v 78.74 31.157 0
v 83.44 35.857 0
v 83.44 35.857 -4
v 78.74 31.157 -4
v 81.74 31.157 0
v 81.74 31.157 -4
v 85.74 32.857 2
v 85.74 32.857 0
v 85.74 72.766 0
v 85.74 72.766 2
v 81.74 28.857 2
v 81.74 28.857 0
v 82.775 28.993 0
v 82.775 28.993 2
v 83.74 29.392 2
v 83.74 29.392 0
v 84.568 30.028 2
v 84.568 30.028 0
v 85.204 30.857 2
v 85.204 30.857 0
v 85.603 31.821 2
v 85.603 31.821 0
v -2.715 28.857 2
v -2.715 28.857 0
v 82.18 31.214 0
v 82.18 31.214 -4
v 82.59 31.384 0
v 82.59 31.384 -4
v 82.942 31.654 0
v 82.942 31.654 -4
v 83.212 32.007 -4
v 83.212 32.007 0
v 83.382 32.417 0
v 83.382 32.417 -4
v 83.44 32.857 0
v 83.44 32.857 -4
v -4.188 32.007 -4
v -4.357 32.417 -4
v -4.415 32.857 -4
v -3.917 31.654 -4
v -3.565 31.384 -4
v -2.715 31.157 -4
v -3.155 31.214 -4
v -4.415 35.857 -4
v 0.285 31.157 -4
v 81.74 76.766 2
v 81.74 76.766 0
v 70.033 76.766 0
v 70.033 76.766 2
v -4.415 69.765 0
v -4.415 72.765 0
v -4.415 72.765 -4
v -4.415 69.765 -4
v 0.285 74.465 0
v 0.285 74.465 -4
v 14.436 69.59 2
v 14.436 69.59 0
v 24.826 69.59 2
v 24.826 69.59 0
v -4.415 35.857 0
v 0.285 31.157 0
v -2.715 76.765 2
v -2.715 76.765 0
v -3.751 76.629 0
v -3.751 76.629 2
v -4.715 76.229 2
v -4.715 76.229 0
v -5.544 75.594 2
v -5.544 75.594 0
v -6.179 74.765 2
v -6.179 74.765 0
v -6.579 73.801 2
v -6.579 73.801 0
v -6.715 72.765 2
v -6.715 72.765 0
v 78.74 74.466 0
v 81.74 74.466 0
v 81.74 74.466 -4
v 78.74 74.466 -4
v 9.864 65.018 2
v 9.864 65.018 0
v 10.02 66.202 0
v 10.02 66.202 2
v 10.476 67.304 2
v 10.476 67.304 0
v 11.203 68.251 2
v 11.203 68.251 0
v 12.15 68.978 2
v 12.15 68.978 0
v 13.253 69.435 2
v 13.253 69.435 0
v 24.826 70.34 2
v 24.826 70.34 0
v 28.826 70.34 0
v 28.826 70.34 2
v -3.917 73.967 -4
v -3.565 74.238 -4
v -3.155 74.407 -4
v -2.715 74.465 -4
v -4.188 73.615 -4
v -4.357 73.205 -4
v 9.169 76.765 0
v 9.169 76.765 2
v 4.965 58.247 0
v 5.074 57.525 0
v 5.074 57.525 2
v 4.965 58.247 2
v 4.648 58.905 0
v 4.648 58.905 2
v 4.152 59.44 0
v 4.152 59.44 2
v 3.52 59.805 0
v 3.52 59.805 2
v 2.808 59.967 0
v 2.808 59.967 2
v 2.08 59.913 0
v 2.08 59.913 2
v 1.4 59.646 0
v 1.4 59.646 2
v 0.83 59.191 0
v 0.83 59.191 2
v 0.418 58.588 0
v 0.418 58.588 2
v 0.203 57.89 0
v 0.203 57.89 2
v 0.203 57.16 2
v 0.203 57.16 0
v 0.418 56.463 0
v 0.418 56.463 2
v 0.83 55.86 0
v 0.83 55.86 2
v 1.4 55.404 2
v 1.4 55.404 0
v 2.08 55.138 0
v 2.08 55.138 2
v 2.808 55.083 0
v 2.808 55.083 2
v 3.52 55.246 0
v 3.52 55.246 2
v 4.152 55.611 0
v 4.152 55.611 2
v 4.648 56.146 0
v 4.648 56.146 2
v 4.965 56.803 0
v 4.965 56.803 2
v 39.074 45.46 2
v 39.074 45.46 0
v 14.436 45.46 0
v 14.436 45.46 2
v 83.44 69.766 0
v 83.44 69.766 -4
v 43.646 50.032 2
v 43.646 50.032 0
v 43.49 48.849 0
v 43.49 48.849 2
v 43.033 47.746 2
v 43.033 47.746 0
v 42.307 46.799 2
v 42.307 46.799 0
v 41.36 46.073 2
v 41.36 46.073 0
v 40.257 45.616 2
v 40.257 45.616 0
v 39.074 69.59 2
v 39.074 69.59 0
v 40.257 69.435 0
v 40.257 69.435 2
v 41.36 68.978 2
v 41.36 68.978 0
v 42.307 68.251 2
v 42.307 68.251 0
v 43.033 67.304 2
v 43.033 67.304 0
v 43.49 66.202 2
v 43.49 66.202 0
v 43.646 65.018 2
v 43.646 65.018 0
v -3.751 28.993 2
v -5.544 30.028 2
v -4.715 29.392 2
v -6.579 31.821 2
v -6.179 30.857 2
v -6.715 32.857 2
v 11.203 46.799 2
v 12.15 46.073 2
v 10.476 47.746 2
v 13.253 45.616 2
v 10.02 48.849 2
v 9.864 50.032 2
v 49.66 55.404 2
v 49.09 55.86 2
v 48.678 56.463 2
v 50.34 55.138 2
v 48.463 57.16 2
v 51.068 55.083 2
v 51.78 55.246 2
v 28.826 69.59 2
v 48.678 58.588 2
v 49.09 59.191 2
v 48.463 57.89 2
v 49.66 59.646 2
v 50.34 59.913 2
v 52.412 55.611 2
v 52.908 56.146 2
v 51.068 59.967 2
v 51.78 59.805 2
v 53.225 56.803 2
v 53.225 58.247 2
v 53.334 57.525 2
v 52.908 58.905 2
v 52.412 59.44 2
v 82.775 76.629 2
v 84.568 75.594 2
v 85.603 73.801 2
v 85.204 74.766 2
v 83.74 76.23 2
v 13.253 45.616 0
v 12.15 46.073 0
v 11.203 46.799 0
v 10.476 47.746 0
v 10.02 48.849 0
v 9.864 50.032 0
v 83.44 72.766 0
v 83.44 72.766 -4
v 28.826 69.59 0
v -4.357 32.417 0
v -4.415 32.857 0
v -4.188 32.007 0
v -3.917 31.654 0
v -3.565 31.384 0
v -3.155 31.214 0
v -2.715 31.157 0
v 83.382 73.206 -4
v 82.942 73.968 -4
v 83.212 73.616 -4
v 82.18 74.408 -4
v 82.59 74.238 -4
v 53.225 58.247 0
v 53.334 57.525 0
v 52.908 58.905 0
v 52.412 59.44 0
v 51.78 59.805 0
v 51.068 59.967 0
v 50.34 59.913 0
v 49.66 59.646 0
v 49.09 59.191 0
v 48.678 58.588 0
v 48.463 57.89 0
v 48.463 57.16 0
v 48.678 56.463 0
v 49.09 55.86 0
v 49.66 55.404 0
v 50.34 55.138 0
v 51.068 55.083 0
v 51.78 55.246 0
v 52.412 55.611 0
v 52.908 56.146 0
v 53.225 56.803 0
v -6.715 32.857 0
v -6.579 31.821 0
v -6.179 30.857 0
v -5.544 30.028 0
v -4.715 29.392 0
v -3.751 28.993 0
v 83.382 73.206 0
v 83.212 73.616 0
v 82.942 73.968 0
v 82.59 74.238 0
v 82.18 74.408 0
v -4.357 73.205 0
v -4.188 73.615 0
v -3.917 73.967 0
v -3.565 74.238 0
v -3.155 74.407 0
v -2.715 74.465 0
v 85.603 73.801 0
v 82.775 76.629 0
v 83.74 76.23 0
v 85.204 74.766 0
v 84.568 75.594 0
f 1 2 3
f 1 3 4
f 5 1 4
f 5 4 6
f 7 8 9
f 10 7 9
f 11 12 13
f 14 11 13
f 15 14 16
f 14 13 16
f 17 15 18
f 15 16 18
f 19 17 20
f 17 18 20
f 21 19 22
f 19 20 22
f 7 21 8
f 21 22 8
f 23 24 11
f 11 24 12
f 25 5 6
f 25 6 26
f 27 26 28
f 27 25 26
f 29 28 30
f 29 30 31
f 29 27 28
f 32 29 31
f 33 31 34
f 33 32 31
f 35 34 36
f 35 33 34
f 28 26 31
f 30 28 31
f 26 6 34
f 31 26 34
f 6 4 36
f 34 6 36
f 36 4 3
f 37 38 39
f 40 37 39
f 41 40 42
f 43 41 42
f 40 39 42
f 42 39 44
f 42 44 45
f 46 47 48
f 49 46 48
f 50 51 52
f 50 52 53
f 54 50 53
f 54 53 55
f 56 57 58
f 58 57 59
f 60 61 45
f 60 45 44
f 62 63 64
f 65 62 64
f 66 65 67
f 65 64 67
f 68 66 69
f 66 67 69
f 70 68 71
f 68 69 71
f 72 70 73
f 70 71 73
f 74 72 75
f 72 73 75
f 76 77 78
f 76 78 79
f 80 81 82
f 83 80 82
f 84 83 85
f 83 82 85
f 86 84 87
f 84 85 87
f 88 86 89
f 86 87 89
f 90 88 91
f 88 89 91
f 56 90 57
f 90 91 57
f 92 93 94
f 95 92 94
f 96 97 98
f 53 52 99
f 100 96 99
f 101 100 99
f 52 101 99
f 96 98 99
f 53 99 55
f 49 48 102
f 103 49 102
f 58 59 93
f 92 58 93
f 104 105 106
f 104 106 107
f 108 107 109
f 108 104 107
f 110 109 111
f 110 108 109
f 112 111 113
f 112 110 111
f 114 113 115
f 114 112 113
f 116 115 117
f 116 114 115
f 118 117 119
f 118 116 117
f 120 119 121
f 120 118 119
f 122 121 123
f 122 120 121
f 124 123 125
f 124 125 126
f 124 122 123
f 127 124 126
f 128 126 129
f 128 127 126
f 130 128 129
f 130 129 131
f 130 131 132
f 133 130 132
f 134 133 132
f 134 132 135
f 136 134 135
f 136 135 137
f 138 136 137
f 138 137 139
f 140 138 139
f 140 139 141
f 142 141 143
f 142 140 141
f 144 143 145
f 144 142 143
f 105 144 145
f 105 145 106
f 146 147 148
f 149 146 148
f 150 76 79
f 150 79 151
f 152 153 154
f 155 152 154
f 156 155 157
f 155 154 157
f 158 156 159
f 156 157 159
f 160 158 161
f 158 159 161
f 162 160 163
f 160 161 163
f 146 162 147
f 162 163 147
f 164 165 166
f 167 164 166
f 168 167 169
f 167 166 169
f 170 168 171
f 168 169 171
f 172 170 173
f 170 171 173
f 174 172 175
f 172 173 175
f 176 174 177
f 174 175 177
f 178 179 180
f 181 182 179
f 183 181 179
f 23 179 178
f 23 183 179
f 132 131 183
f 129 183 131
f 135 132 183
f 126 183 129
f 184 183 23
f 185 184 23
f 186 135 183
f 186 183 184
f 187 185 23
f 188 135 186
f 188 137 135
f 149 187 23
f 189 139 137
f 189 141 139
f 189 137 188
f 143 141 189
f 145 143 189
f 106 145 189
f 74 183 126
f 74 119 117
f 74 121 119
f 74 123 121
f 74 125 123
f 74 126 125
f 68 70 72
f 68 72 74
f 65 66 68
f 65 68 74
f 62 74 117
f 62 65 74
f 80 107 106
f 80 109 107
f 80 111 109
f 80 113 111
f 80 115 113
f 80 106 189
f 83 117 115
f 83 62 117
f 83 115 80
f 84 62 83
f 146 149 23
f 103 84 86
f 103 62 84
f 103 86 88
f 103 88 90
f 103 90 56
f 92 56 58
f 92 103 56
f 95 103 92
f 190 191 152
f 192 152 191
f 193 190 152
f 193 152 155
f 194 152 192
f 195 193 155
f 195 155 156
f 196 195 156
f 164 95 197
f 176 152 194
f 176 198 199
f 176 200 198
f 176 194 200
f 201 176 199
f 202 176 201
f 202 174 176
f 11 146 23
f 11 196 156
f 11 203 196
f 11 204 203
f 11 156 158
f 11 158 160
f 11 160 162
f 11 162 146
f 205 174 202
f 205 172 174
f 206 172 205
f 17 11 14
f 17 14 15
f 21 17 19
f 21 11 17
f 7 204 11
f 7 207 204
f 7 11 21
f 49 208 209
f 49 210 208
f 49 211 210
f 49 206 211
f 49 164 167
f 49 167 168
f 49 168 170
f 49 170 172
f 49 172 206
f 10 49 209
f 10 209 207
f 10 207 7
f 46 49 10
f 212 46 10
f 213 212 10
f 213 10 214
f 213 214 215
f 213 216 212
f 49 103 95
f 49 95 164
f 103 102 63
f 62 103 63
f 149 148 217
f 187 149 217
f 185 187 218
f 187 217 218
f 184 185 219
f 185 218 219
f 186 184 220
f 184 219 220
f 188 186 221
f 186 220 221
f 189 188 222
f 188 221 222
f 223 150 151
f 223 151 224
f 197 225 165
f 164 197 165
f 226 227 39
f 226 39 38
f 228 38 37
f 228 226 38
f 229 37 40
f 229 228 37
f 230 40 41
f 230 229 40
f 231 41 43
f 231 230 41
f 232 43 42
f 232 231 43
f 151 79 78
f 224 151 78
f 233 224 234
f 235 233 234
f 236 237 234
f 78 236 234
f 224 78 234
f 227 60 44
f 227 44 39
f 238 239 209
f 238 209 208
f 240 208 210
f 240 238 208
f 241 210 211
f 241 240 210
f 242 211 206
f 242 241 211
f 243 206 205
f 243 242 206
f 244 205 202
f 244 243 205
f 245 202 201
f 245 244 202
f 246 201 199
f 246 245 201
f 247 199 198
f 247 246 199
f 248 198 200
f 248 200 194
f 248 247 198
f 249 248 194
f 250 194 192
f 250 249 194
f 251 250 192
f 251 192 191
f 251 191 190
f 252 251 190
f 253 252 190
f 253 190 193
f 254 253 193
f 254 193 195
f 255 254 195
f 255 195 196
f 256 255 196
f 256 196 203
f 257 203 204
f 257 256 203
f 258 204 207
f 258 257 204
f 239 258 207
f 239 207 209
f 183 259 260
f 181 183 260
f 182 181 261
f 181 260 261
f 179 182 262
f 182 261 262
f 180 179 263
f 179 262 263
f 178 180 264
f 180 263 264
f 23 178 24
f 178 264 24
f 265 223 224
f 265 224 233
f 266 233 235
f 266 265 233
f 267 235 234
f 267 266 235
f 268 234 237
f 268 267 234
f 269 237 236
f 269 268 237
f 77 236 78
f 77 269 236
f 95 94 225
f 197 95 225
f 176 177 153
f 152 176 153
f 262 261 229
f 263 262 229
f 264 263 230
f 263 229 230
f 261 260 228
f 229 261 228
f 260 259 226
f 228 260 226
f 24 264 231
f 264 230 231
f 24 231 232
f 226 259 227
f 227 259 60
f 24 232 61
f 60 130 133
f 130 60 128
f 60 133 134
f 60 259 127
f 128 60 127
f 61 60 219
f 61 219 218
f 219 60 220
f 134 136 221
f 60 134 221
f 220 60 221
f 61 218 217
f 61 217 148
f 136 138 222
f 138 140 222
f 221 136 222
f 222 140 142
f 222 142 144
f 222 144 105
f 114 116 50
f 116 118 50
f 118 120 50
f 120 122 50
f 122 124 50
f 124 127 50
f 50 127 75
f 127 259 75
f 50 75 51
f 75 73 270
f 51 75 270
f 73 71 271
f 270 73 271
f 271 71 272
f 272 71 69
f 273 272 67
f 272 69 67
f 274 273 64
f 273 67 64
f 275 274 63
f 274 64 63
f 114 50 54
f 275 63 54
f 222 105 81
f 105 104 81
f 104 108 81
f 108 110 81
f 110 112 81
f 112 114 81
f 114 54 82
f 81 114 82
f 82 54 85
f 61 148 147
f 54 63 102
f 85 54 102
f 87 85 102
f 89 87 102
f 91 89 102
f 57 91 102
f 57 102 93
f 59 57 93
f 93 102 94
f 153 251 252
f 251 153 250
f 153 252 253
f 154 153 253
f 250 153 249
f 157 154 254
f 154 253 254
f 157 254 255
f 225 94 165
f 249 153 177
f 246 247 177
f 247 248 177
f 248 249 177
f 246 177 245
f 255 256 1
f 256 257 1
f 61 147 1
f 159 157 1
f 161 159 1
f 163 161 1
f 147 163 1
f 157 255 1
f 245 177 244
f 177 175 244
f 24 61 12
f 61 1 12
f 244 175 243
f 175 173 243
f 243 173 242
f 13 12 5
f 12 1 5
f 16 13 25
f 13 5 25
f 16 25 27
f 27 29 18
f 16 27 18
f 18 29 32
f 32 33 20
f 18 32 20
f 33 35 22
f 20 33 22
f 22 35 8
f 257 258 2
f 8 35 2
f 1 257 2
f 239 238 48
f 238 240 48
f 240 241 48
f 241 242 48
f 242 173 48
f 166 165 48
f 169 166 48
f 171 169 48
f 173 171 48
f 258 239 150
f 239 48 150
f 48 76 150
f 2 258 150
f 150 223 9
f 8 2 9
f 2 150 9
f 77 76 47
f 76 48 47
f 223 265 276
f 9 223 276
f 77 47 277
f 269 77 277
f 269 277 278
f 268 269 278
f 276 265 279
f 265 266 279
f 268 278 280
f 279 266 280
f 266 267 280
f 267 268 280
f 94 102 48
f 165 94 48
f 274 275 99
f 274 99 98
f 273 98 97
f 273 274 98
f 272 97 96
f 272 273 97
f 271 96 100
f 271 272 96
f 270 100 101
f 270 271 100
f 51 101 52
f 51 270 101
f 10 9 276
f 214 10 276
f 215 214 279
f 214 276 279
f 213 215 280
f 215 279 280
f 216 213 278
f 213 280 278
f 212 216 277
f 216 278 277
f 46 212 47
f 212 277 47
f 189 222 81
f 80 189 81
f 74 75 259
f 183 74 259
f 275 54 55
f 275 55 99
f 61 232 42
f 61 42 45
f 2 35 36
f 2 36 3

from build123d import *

# Parameters (mm, degrees)
SKETCH1_R           = 2.449
BOSS_EXTRUDE2_DEPTH = 2
BOSS_EXTRUDE3_DEPTH = 4


with BuildPart() as part:
    # Sketch1 → Boss-Extrude2 (new body)
    with BuildSketch(Plane.XY):
        with BuildLine():
            Line((9.168561928, 76.765332221), (-2.715276814, 76.765332221))
            ThreePointArc((-2.715276814, 76.765332221), (-5.543703939, 75.593759346), (-6.715276814, 72.765332221))
            Line((-6.715276814, 72.765332221), (-6.715276814, 32.85651365))
            ThreePointArc((-6.715276814, 32.85651365), (-5.543703939, 30.028086525), (-2.715276814, 28.85651365))
            Line((-2.715276814, 28.85651365), (81.739723186, 28.85651365))
            ThreePointArc((81.739723186, 28.85651365), (84.56815031, 30.028086525), (85.739723186, 32.85651365))
            Line((85.739723186, 32.85651365), (85.739723186, 72.765508714))
            ThreePointArc((85.739723186, 72.765508714), (84.56815031, 75.593935839), (81.739723186, 76.765508714))
            Line((81.739723186, 76.765508714), (70.033136805, 76.765508714))
            Line((70.033136805, 76.765508714), (9.168561928, 76.765332221))
        make_face()
        with Locations((50.884863874, 57.525313638)):
            Circle(SKETCH1_R, mode=Mode.SUBTRACT)
        with Locations((2.624863871, 57.525313638)):
            Circle(SKETCH1_R, mode=Mode.SUBTRACT)
        with BuildLine():
            Line((36.022761907, 69.590313638), (39.073863873, 69.590313638))
            ThreePointArc((39.073863873, 69.590313638), (42.306756076, 68.251205842), (43.645863873, 65.018313638))
            Line((43.645863873, 65.018313638), (43.645863873, 50.032313637))
            ThreePointArc((43.645863873, 50.032313637), (42.306756076, 46.799421434), (39.073863873, 45.460313637))
            Line((39.073863873, 45.460313637), (36.022761907, 45.460313637))
            Line((36.022761907, 45.460313637), (17.486965838, 45.460313637))
            Line((17.486965838, 45.460313637), (14.435863872, 45.460313637))
            ThreePointArc((14.435863872, 45.460313637), (11.202971669, 46.799421434), (9.863863872, 50.032313637))
            Line((9.863863872, 50.032313637), (9.863863872, 65.018313638))
            ThreePointArc((9.863863872, 65.018313638), (11.202971669, 68.251205842), (14.435863872, 69.590313638))
            Line((14.435863872, 69.590313638), (17.486965838, 69.590313638))
            Line((17.486965838, 69.590313638), (24.826000411, 69.590313638))
            Line((24.826000411, 69.590313638), (24.826000411, 70.340313638))
            Line((24.826000411, 70.340313638), (28.826000411, 70.340313638))
            Line((28.826000411, 70.340313638), (28.826000411, 69.590313638))
            Line((28.826000411, 69.590313638), (36.022761907, 69.590313638))
        make_face(mode=Mode.SUBTRACT)
    extrude(amount=BOSS_EXTRUDE2_DEPTH)

    # Sketch2 → Boss-Extrude3 (add)
    with BuildSketch(Plane(origin=(0, 0, 0), x_dir=(-1, 0, 0), z_dir=(0, 0, -1))):
        with BuildLine():
            Line((-83.439723186, 32.85651365), (-83.439723186, 35.85651365))
            Line((-83.439723186, 35.85651365), (-78.739723186, 31.15651365))
            Line((-78.739723186, 31.15651365), (-81.739723186, 31.15651365))
            ThreePointArc((-81.739723186, 31.15651365), (-82.941804714, 31.654432122), (-83.439723186, 32.85651365))
        make_face()
        with BuildLine():
            Line((-81.739723186, 74.465508714), (-78.739723186, 74.465508714))
            Line((-78.739723186, 74.465508714), (-83.439723186, 69.765508714))
            Line((-83.439723186, 69.765508714), (-83.439723186, 72.765508714))
            ThreePointArc((-83.439723186, 72.765508714), (-82.941804714, 73.967590242), (-81.739723186, 74.465508714))
        make_face()
        with BuildLine():
            Line((2.715276814, 31.15651365), (-0.284723186, 31.15651365))
            Line((-0.284723186, 31.15651365), (4.415276814, 35.85651365))
            Line((4.415276814, 35.85651365), (4.415276814, 32.85651365))
            ThreePointArc((4.415276814, 32.85651365), (3.917358342, 31.654432122), (2.715276814, 31.15651365))
        make_face()
        with BuildLine():
            Line((4.415276814, 72.765332221), (4.415276814, 69.765332221))
            Line((4.415276814, 69.765332221), (-0.284723186, 74.465332221))
            Line((-0.284723186, 74.465332221), (2.715276814, 74.465332221))
            ThreePointArc((2.715276814, 74.465332221), (3.917358342, 73.967413749), (4.415276814, 72.765332221))
        make_face()
    extrude(amount=BOSS_EXTRUDE3_DEPTH)


solid = part.part
